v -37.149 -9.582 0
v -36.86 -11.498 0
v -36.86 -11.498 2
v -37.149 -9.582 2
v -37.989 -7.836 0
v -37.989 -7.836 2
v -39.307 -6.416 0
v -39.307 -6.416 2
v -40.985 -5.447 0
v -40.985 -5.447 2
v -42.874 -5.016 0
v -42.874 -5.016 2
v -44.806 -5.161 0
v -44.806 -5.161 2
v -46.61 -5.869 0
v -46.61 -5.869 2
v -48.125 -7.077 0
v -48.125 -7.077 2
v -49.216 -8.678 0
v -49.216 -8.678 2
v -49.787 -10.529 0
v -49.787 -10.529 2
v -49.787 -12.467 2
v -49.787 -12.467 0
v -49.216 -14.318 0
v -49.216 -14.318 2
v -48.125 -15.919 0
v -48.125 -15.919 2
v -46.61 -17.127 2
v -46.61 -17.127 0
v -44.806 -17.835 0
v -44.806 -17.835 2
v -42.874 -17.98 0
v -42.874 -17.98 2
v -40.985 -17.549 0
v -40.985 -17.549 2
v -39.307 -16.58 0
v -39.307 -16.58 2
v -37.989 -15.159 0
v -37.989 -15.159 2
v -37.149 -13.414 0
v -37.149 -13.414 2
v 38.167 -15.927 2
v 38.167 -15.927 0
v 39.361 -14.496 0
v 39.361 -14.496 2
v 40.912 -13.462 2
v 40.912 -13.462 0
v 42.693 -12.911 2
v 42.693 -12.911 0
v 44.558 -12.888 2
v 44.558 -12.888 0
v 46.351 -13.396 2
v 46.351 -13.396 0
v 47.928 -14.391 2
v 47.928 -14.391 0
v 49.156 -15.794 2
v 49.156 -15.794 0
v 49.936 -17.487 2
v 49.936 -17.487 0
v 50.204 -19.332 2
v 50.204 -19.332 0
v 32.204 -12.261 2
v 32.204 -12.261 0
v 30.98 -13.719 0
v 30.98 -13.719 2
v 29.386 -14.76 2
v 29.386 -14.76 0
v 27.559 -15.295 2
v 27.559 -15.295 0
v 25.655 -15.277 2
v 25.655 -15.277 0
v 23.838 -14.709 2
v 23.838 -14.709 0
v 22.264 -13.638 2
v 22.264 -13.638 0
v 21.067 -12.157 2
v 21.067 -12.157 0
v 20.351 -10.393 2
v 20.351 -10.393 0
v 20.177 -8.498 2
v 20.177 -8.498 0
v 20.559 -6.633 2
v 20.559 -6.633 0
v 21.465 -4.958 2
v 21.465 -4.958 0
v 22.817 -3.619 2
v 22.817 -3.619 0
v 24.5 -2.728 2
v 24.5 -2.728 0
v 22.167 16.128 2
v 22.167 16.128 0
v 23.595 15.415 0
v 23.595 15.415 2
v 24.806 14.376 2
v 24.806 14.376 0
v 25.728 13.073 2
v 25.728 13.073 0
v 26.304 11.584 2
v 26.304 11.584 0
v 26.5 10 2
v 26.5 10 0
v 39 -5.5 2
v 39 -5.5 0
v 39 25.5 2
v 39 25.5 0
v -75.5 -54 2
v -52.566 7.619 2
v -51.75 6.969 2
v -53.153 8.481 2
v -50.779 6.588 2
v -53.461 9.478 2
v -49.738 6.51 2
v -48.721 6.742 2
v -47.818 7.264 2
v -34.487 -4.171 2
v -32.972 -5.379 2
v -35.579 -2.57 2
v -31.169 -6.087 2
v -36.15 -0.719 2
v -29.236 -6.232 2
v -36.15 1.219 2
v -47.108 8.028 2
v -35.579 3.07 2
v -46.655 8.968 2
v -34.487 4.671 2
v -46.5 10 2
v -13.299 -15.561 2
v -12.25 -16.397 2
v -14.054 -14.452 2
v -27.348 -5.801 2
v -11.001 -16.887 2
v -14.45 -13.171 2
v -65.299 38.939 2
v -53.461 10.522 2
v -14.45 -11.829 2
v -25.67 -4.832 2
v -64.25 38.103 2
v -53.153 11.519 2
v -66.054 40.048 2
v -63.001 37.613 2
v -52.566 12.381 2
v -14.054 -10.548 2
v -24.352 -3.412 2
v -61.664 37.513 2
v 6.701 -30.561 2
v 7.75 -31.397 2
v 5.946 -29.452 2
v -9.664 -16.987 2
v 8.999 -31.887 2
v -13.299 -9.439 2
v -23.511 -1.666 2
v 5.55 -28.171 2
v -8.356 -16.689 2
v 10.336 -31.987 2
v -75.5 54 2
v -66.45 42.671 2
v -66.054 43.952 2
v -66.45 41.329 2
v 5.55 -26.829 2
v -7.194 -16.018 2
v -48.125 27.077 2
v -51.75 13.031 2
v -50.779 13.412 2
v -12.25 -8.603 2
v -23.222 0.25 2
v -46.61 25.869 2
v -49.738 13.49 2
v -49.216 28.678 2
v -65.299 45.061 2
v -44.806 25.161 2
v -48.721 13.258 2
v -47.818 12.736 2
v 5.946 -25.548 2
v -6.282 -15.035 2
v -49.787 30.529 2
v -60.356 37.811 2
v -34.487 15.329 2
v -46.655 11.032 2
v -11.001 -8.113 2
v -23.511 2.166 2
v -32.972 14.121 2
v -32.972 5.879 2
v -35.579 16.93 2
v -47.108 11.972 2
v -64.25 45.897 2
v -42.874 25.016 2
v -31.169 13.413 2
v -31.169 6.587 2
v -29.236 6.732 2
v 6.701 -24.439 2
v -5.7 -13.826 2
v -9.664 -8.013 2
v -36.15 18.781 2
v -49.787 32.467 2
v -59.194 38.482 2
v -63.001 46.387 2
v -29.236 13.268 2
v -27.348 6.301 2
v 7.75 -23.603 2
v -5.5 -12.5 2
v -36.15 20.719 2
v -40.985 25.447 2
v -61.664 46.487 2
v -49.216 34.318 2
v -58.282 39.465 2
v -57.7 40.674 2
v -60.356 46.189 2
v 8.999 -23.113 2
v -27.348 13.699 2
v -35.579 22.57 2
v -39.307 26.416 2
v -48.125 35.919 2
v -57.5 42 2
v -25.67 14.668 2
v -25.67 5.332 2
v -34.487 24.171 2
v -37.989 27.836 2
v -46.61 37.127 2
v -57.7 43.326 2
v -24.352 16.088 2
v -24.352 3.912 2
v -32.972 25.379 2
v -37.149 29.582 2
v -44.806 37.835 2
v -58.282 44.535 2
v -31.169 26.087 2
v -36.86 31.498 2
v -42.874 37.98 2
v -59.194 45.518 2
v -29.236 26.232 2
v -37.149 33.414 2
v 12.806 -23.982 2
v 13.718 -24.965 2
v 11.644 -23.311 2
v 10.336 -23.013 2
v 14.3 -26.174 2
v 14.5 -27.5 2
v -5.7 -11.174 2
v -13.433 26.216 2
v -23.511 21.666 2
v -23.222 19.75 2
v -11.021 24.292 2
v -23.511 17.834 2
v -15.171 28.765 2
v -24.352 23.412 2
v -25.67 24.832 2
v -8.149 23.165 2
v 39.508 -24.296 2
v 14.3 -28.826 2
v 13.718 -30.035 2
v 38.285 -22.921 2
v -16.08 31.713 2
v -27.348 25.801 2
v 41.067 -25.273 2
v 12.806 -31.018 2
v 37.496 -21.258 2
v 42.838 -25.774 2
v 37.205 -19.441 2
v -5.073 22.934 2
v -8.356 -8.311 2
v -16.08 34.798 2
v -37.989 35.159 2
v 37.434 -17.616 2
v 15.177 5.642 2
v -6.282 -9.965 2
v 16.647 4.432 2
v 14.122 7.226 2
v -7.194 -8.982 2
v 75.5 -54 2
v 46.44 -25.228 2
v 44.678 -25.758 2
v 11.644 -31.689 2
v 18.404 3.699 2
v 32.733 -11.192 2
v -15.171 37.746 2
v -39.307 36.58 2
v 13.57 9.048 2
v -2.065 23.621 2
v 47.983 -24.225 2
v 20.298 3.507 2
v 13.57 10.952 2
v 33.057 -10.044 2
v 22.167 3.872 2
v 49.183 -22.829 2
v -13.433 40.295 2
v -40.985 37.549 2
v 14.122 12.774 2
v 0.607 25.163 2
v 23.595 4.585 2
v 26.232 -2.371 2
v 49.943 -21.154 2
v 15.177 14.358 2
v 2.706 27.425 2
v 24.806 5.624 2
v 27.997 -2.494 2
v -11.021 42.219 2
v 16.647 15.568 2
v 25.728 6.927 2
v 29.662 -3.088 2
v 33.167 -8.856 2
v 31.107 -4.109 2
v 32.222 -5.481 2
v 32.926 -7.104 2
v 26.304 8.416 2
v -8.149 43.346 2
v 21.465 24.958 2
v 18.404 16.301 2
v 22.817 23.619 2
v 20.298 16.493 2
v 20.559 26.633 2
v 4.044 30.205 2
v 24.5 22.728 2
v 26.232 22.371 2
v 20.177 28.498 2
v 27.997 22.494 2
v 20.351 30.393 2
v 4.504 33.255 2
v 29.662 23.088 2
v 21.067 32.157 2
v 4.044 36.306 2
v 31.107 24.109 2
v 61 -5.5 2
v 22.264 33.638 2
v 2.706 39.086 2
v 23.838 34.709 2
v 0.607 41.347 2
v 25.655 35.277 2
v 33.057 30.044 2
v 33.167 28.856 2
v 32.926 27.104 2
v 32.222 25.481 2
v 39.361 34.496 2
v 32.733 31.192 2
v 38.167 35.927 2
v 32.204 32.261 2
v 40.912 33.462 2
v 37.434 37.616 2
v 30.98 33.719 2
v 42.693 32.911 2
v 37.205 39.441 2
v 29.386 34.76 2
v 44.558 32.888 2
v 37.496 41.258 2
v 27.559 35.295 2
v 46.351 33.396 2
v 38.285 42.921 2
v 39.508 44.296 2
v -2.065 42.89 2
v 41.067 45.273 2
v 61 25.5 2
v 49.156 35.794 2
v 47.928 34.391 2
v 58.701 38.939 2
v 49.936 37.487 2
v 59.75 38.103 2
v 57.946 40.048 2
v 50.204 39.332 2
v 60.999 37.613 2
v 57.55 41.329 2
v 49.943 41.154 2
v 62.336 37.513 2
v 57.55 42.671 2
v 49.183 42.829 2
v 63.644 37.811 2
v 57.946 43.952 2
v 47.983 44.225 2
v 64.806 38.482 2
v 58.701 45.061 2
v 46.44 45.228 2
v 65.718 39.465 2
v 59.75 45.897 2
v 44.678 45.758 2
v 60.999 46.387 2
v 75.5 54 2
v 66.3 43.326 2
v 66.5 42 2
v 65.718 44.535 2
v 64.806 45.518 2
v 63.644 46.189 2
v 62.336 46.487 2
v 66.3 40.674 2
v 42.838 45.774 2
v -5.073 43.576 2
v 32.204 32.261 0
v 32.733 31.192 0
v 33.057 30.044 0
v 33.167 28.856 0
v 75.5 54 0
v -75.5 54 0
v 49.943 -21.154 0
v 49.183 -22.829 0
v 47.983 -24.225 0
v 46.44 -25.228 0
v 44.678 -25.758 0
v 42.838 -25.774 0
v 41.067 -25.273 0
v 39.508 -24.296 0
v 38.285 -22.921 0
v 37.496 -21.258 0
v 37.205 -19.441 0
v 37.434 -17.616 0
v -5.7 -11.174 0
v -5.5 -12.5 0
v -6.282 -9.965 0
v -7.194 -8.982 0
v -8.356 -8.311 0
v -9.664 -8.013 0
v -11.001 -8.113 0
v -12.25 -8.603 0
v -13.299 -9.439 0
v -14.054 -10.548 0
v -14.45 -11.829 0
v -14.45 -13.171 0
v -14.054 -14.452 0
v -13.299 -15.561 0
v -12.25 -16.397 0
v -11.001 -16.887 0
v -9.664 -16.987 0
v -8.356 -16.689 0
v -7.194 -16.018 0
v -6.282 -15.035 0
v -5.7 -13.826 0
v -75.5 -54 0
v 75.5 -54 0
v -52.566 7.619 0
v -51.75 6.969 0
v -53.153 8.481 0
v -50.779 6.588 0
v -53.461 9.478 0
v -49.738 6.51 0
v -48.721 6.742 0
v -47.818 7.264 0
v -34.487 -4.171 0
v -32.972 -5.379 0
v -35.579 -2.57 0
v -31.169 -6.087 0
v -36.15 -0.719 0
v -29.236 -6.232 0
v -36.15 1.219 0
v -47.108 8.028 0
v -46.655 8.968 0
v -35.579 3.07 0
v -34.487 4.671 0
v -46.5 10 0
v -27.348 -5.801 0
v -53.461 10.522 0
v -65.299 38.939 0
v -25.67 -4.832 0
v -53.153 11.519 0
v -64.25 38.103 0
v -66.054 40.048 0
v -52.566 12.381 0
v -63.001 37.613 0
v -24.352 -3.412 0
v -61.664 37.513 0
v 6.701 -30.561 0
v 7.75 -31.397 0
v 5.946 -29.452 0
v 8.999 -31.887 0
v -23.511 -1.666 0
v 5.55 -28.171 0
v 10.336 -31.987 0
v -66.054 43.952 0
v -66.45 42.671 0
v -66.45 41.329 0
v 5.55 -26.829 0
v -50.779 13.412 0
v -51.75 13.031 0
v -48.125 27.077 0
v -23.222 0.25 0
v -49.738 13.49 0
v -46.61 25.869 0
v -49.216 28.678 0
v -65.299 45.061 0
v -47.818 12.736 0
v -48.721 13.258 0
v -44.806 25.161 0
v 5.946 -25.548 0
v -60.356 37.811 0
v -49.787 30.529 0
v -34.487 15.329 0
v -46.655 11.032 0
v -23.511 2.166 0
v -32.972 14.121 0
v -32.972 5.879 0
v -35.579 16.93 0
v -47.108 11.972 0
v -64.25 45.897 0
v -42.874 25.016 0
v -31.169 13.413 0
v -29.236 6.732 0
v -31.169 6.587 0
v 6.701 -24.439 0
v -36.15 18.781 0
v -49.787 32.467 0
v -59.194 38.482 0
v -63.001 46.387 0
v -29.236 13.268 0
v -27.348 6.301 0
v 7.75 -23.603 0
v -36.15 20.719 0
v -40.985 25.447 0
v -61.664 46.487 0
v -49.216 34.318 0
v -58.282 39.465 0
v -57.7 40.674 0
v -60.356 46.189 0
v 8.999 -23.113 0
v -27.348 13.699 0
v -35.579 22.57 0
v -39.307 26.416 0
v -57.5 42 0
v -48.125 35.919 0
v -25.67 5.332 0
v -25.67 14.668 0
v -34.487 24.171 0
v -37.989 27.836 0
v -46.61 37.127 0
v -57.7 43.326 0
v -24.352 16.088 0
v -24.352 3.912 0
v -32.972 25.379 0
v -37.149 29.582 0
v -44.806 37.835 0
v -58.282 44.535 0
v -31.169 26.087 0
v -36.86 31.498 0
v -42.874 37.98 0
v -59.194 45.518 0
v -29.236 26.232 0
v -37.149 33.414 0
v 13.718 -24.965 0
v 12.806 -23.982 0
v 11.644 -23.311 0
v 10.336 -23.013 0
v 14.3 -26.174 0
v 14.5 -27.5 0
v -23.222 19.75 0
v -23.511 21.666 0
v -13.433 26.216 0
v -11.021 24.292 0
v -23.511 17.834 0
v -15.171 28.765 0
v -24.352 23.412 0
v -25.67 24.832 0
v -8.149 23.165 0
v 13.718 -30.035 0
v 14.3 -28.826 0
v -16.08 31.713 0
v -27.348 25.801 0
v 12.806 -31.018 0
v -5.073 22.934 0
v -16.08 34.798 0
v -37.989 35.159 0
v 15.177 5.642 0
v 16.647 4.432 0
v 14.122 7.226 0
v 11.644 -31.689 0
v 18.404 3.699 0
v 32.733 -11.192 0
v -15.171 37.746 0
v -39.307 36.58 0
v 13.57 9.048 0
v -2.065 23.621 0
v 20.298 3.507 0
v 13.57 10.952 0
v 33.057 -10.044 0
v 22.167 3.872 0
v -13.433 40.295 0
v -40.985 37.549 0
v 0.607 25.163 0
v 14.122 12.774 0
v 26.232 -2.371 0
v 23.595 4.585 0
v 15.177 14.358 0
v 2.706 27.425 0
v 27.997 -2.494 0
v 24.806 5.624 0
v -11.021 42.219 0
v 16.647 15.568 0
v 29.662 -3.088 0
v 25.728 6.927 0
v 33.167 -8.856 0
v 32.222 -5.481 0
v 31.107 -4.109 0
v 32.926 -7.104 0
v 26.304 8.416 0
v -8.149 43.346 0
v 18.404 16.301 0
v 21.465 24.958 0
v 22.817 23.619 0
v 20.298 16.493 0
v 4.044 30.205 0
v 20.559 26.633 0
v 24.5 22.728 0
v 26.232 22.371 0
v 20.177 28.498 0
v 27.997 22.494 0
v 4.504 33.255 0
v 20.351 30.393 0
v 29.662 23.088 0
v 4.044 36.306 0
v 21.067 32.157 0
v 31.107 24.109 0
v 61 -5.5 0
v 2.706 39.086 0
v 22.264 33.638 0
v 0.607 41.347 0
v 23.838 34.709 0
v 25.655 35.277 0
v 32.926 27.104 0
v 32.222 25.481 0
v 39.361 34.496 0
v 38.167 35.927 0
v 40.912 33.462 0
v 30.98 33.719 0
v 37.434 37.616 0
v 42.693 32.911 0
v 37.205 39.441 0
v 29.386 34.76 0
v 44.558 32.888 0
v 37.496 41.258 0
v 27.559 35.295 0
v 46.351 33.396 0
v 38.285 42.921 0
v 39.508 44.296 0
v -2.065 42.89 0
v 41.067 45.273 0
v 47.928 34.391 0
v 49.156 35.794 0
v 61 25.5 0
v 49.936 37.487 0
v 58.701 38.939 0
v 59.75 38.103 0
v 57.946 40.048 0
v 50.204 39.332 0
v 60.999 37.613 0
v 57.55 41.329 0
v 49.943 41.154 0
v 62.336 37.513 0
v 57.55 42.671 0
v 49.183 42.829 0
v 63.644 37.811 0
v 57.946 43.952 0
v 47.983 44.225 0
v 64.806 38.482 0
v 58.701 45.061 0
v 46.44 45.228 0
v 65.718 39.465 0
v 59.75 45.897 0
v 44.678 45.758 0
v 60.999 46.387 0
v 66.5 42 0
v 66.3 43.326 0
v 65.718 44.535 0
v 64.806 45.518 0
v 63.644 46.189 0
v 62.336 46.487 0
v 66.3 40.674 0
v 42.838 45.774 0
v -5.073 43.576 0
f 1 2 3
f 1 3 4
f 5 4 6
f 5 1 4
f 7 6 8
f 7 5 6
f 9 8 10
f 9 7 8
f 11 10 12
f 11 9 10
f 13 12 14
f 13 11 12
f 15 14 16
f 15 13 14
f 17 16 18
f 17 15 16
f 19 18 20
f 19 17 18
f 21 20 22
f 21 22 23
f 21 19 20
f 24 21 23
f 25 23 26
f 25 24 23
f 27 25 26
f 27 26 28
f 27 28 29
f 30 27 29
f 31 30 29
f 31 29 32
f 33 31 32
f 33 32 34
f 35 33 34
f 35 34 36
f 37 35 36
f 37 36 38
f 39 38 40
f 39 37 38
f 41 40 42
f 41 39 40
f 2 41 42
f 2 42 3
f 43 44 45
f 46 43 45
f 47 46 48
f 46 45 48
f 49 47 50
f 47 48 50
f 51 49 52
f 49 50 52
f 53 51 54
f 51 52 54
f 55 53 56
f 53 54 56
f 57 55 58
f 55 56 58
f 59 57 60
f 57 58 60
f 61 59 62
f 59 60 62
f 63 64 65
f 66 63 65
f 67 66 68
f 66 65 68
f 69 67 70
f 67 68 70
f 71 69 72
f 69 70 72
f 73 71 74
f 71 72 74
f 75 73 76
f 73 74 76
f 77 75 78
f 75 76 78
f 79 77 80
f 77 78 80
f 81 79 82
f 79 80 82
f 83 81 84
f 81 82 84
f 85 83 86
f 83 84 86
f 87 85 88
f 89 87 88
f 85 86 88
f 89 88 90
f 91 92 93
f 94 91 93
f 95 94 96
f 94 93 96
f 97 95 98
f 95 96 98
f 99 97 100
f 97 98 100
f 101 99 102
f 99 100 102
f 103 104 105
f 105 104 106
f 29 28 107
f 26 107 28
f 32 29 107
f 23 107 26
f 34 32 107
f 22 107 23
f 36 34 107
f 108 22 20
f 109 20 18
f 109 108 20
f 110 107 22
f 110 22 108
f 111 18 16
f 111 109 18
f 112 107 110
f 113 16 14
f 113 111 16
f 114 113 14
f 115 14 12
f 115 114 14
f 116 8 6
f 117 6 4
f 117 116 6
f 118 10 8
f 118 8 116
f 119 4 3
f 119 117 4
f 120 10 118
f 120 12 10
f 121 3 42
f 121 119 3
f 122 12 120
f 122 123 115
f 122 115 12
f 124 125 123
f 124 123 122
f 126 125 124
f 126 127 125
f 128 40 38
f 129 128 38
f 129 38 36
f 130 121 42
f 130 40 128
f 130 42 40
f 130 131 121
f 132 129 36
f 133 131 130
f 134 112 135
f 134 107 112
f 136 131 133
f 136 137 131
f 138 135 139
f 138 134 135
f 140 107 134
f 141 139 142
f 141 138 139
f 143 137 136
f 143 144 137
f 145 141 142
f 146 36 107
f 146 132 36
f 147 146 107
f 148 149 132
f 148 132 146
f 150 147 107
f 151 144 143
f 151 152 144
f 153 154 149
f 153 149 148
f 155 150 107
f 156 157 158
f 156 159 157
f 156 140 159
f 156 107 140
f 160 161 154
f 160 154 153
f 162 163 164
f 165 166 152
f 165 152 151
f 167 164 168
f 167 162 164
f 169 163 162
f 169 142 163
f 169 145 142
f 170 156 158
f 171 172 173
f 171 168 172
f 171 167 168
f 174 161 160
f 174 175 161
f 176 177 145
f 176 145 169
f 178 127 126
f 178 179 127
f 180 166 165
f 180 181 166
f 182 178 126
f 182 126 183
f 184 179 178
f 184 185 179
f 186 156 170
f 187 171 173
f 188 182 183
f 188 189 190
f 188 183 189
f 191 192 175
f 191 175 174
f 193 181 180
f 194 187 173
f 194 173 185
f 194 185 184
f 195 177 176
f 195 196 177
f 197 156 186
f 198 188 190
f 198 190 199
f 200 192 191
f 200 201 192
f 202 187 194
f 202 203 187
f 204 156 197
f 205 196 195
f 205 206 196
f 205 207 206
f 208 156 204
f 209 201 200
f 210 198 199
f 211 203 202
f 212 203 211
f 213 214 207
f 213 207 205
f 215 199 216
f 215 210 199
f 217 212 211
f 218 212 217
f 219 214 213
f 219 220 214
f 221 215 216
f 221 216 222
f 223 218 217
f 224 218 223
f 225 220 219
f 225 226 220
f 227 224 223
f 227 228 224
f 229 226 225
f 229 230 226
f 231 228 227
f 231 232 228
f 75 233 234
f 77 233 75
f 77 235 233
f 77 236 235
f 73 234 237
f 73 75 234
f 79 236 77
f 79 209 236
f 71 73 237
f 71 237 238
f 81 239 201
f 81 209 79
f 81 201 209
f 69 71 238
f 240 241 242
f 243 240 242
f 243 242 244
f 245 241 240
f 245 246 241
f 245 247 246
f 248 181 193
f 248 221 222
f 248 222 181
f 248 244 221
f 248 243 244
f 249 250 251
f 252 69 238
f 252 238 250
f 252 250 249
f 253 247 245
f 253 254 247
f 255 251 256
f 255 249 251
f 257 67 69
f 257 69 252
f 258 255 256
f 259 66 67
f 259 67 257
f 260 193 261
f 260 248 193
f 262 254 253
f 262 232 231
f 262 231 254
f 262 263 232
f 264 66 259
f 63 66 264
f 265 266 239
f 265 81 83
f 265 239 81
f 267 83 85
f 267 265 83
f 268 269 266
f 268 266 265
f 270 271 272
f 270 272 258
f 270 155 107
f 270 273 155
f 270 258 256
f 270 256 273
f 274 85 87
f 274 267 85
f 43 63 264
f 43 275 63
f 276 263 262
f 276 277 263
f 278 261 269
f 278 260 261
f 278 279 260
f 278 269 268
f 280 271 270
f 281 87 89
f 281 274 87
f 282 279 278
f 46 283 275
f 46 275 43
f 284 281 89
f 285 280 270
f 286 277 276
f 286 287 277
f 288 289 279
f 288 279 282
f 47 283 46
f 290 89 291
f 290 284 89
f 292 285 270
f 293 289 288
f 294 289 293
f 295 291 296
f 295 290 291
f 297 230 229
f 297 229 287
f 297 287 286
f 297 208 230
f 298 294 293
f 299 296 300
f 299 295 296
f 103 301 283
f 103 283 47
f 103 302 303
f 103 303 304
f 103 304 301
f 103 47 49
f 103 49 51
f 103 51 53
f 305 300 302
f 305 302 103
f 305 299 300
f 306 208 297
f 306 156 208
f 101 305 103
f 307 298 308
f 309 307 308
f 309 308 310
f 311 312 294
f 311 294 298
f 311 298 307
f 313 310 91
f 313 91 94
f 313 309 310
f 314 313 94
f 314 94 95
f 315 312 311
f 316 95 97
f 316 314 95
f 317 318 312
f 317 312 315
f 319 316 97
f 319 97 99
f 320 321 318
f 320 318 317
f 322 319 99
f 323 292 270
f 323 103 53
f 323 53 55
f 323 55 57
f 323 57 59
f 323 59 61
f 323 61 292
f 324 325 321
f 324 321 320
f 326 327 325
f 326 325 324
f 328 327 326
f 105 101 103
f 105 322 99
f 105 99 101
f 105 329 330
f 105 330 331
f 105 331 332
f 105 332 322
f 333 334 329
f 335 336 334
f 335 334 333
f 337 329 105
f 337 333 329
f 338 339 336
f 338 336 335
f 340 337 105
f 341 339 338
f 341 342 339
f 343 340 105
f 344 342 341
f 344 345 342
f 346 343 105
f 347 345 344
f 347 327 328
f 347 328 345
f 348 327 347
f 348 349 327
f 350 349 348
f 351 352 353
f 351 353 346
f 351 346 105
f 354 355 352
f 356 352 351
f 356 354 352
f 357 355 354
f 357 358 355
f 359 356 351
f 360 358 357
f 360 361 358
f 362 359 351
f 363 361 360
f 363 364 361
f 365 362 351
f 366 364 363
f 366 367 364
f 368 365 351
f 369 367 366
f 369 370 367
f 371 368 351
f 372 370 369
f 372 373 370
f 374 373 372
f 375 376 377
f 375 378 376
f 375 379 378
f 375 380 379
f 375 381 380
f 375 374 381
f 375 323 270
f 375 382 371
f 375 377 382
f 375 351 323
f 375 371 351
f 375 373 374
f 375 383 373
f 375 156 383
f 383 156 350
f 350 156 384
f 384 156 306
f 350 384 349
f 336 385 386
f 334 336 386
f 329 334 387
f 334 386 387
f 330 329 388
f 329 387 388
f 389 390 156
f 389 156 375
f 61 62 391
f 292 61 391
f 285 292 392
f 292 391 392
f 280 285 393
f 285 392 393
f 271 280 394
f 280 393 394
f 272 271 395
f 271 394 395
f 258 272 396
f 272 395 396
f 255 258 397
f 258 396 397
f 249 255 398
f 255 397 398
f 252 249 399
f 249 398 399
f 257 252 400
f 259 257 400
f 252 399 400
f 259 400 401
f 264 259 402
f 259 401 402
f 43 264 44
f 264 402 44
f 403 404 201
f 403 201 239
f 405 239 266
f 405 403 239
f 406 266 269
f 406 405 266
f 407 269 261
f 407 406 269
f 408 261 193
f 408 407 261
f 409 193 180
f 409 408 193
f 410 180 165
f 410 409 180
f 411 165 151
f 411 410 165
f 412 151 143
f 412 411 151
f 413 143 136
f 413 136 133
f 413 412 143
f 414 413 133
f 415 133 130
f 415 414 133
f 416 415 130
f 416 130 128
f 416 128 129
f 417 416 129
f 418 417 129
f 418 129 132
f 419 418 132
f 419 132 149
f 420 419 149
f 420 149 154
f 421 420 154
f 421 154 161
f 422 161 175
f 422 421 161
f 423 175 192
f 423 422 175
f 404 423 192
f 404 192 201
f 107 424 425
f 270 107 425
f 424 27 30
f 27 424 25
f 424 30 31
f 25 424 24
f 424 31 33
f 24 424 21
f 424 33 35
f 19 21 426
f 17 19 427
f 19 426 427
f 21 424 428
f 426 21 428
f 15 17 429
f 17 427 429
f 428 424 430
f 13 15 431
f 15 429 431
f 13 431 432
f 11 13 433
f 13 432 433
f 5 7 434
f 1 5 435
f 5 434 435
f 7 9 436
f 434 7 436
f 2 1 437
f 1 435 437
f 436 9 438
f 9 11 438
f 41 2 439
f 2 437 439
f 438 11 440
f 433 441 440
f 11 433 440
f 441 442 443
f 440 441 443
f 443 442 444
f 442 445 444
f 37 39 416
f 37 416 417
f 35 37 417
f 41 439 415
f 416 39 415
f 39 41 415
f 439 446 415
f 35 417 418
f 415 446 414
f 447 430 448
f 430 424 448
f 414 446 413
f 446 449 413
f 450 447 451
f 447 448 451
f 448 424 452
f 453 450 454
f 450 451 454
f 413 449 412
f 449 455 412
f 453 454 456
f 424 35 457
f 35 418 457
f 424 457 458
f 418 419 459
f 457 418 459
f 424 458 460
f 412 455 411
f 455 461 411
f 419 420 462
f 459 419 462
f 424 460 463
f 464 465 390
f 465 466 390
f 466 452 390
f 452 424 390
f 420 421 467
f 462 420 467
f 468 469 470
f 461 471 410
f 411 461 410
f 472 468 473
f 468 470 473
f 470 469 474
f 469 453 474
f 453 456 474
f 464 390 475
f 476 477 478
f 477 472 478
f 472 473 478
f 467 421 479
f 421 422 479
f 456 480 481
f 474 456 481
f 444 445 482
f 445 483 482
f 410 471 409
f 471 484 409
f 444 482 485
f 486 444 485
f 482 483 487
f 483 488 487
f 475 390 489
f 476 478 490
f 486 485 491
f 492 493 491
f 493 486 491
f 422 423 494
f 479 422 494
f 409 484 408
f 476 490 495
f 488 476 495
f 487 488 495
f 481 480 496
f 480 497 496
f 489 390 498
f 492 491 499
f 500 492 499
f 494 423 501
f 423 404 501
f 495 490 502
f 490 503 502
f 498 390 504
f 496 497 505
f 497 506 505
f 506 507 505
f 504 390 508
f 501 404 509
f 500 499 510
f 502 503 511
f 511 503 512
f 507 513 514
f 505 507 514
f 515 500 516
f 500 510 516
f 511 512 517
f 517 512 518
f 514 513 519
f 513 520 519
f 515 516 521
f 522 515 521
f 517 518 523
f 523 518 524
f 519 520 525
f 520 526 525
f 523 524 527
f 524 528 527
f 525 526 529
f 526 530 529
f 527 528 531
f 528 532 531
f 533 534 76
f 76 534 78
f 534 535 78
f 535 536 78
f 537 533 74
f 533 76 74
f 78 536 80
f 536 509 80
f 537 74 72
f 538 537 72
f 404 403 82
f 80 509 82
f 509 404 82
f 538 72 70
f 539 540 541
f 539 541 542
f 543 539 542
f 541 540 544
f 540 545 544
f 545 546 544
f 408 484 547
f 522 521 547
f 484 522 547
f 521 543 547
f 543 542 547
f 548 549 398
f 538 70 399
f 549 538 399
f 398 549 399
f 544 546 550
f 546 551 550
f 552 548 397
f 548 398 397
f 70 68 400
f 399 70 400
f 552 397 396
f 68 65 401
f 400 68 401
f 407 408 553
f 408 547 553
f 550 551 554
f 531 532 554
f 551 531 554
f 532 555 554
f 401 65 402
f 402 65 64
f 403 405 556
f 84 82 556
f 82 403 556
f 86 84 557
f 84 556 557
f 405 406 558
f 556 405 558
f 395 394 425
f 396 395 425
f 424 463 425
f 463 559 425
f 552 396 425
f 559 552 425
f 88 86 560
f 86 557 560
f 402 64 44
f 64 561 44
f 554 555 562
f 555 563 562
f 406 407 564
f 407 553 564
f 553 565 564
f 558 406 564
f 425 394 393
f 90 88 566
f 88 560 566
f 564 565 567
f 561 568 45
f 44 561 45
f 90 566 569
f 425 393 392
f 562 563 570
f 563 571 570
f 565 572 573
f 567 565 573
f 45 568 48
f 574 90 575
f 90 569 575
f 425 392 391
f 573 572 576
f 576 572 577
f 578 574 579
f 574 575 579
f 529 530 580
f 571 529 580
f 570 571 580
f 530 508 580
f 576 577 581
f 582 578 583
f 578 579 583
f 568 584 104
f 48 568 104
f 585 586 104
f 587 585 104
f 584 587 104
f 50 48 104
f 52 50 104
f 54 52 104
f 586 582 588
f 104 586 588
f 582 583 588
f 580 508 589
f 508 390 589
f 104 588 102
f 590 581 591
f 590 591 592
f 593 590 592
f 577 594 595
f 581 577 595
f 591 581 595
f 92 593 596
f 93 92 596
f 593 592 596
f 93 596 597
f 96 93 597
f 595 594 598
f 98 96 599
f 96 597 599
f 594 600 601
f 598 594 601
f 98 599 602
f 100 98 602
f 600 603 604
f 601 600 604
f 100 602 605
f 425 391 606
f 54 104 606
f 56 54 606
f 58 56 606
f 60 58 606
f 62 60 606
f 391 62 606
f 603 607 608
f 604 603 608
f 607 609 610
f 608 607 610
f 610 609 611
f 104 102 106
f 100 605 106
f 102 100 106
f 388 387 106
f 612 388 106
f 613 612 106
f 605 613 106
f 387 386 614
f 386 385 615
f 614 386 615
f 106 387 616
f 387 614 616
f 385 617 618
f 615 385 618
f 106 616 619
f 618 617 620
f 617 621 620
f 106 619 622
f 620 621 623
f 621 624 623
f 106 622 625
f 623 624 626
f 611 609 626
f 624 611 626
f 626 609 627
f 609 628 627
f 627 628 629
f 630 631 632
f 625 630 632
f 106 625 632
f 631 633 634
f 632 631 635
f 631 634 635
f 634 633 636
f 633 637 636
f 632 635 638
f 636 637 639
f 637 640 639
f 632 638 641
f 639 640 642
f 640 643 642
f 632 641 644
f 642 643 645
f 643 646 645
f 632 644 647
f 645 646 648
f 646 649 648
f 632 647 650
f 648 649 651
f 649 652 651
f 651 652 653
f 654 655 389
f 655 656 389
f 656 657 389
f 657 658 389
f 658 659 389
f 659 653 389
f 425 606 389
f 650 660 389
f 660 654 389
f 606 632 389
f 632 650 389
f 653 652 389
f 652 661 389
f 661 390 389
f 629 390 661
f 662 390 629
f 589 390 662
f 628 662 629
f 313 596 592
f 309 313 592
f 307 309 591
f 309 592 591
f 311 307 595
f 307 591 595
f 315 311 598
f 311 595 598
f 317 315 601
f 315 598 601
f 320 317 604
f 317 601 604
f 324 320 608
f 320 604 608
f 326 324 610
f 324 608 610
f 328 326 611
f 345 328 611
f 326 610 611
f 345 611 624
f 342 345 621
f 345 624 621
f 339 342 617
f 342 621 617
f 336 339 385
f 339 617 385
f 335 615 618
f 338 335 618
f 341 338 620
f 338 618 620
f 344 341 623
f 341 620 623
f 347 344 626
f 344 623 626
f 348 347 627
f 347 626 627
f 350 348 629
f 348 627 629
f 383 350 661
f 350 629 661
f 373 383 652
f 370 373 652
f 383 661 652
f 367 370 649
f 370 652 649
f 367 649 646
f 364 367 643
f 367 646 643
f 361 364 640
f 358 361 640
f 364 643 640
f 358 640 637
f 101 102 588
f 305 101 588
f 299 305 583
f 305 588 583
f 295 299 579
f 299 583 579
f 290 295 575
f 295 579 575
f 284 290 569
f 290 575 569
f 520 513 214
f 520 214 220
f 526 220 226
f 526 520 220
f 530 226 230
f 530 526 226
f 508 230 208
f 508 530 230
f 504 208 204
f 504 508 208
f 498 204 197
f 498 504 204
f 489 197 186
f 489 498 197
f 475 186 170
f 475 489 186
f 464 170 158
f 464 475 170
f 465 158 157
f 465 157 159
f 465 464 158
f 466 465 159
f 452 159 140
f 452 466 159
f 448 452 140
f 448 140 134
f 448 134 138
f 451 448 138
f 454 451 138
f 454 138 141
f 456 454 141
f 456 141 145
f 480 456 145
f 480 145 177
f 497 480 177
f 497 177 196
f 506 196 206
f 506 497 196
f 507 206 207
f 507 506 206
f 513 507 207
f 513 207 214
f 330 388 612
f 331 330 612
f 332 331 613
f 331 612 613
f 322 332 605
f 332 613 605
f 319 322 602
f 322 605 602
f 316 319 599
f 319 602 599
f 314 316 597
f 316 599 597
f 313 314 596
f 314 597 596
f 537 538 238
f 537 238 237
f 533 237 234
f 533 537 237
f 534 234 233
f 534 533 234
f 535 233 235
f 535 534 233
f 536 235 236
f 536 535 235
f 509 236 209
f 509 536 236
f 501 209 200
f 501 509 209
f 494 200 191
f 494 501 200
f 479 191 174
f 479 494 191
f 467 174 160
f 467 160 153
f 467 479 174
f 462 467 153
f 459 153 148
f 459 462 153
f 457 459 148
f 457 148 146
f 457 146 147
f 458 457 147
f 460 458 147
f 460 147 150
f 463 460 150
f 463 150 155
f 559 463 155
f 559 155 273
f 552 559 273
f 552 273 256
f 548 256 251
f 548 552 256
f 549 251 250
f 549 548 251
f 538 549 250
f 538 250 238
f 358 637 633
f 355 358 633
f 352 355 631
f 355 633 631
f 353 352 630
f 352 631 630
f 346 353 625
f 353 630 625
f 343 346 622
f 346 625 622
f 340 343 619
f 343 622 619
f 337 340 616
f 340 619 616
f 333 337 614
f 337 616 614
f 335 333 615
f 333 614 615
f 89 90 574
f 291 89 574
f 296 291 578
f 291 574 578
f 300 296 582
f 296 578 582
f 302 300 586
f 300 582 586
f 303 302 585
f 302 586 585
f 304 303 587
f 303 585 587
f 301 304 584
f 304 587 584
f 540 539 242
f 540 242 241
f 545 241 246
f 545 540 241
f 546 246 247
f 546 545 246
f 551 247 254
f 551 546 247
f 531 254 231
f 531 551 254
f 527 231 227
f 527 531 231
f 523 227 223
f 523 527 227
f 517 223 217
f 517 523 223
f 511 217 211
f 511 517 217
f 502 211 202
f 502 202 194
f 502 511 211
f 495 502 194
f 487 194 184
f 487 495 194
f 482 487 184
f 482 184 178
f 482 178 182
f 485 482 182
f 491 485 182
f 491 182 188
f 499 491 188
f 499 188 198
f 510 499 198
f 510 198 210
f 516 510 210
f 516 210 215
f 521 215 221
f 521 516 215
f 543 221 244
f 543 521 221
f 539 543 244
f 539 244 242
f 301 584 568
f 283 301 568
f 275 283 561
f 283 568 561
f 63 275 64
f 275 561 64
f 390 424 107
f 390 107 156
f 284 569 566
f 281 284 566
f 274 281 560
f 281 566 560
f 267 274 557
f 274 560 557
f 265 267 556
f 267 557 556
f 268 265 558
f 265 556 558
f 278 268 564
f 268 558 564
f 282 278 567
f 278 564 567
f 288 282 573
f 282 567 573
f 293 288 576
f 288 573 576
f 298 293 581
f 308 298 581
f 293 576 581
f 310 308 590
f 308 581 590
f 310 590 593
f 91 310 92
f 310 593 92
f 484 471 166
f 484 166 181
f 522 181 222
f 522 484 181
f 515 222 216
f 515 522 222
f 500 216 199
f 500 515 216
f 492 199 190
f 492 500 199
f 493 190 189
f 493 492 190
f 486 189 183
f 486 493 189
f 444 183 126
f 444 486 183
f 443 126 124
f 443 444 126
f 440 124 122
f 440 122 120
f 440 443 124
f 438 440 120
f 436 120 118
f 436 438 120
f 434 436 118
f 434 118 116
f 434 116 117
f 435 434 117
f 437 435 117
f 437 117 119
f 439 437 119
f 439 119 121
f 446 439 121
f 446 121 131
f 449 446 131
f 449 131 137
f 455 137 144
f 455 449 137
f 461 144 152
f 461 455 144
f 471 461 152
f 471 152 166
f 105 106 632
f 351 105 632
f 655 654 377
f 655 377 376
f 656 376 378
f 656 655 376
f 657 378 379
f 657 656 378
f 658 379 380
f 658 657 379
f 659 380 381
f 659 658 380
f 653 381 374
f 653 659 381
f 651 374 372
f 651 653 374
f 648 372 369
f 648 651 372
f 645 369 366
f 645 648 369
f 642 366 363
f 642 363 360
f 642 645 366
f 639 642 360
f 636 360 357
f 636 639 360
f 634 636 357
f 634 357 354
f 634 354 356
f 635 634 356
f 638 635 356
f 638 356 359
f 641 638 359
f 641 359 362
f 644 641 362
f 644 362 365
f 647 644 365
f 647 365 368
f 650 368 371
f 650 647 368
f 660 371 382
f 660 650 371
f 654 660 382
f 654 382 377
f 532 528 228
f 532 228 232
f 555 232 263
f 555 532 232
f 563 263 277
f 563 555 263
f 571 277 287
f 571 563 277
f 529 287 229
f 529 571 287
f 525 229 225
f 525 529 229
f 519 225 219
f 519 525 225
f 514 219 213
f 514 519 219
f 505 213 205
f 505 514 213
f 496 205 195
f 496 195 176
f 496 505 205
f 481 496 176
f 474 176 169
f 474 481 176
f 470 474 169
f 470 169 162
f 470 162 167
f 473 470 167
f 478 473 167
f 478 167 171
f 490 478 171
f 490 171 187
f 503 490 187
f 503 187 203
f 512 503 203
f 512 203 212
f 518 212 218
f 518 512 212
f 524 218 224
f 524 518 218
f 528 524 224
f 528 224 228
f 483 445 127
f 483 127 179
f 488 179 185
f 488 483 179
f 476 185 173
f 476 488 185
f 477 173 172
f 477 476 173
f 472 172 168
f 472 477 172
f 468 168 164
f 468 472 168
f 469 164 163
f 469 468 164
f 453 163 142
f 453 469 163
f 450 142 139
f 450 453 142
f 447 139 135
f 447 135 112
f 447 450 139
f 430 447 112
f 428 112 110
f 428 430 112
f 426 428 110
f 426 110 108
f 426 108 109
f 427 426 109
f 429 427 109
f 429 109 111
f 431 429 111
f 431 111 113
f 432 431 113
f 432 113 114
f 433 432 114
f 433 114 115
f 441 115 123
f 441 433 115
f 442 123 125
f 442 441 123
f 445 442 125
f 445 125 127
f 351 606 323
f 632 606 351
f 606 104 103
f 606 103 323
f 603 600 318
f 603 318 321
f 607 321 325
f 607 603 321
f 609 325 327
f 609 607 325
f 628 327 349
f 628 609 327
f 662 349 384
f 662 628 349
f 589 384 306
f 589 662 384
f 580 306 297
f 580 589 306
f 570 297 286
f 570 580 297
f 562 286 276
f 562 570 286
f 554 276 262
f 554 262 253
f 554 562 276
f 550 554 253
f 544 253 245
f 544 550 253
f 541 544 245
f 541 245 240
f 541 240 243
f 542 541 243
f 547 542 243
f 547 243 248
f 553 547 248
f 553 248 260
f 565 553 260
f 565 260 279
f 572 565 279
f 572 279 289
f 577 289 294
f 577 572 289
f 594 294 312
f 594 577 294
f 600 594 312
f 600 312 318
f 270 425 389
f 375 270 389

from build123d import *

# Parameters (mm, degrees)
F0_W     = 151
F0_H     = 108
F0_R     = 6.5
F0_R_2   = 4.5
F0_R_3   = 3.5
F0_R_4   = 10.35
F0_W_2   = 22
F0_H_2   = 31
F1_DEPTH = 2


with BuildPart() as f1:
    # F0 (on Top) → F1 (new body)
    with BuildSketch(Plane.XY):
        with BuildLine():
            ThreePointArc((50.203704, -19.331837), (45.47278, -13.077209), (38.166667, -15.927249))
            ThreePointArc((38.166667, -15.927249), (41.934628, -25.586465), (50.203704, -19.331837))
        make_face()
        with BuildLine():
            ThreePointArc((50.203704, 39.331837), (41.934628, 45.586465), (38.166667, 35.927249))
            ThreePointArc((38.166667, 35.927249), (45.47278, 33.077209), (50.203704, 39.331837))
        make_face()
        Rectangle(F0_W, F0_H)
        with Locations((-43.3599, -11.497885)):
            Circle(F0_R, mode=Mode.SUBTRACT)
        with Locations((-10, -12.5)):
            Circle(F0_R_2, mode=Mode.SUBTRACT)
        with Locations((10, -27.5)):
            Circle(F0_R_2, mode=Mode.SUBTRACT)
        with BuildLine():
            ThreePointArc((32.203704, -12.260769), (21.611111, -12.941687), (24.5, -2.727922))
            ThreePointArc((24.5, -2.727922), (30.419443, -3.548953), (33.166667, -8.856181))
            ThreePointArc((33.166667, -8.856181), (32.921295, -10.625257), (32.203704, -12.260769))
        make_face(mode=Mode.SUBTRACT)
        with BuildLine():
            ThreePointArc((50.203704, -19.331837), (41.934628, -25.586465), (38.166667, -15.927249))
            ThreePointArc((38.166667, -15.927249), (45.47278, -13.077209), (50.203704, -19.331837))
        make_face(mode=Mode.SUBTRACT)
        with Locations((-50, 10)):
            Circle(F0_R_3, mode=Mode.SUBTRACT)
        with Locations((-29.722222, 0.25004)):
            Circle(F0_R, mode=Mode.SUBTRACT)
        with Locations((-29.722222, 19.74996)):
            Circle(F0_R, mode=Mode.SUBTRACT)
        with Locations((-43.3599, 31.497885)):
            Circle(F0_R, mode=Mode.SUBTRACT)
        with Locations((-62, 42)):
            Circle(F0_R_2, mode=Mode.SUBTRACT)
        with Locations((-5.846048, 33.255358)):
            Circle(F0_R_4, mode=Mode.SUBTRACT)
        with BuildLine():
            ThreePointArc((22.166667, 16.128259), (25.307228, 13.752777), (26.5, 10))
            ThreePointArc((26.5, 10), (25.307228, 6.247223), (22.166667, 3.871741))
            ThreePointArc((22.166667, 3.871741), (13.5, 10), (22.166667, 16.128259))
        make_face(mode=Mode.SUBTRACT)
        with Locations((50, 10)):
            Rectangle(F0_W_2, F0_H_2, mode=Mode.SUBTRACT)
        with BuildLine():
            ThreePointArc((33.166667, 28.856181), (30.419443, 23.548953), (24.5, 22.727922))
            ThreePointArc((24.5, 22.727922), (21.611111, 32.941687), (32.203704, 32.260769))
            ThreePointArc((32.203704, 32.260769), (32.921295, 30.625257), (33.166667, 28.856181))
        make_face(mode=Mode.SUBTRACT)
        with BuildLine():
            ThreePointArc((50.203704, 39.331837), (45.47278, 33.077209), (38.166667, 35.927249))
            ThreePointArc((38.166667, 35.927249), (41.934628, 45.586465), (50.203704, 39.331837))
        make_face(mode=Mode.SUBTRACT)
        with Locations((62, 42)):
            Circle(F0_R_2, mode=Mode.SUBTRACT)
    extrude(amount=F1_DEPTH)


solid = f1.part
